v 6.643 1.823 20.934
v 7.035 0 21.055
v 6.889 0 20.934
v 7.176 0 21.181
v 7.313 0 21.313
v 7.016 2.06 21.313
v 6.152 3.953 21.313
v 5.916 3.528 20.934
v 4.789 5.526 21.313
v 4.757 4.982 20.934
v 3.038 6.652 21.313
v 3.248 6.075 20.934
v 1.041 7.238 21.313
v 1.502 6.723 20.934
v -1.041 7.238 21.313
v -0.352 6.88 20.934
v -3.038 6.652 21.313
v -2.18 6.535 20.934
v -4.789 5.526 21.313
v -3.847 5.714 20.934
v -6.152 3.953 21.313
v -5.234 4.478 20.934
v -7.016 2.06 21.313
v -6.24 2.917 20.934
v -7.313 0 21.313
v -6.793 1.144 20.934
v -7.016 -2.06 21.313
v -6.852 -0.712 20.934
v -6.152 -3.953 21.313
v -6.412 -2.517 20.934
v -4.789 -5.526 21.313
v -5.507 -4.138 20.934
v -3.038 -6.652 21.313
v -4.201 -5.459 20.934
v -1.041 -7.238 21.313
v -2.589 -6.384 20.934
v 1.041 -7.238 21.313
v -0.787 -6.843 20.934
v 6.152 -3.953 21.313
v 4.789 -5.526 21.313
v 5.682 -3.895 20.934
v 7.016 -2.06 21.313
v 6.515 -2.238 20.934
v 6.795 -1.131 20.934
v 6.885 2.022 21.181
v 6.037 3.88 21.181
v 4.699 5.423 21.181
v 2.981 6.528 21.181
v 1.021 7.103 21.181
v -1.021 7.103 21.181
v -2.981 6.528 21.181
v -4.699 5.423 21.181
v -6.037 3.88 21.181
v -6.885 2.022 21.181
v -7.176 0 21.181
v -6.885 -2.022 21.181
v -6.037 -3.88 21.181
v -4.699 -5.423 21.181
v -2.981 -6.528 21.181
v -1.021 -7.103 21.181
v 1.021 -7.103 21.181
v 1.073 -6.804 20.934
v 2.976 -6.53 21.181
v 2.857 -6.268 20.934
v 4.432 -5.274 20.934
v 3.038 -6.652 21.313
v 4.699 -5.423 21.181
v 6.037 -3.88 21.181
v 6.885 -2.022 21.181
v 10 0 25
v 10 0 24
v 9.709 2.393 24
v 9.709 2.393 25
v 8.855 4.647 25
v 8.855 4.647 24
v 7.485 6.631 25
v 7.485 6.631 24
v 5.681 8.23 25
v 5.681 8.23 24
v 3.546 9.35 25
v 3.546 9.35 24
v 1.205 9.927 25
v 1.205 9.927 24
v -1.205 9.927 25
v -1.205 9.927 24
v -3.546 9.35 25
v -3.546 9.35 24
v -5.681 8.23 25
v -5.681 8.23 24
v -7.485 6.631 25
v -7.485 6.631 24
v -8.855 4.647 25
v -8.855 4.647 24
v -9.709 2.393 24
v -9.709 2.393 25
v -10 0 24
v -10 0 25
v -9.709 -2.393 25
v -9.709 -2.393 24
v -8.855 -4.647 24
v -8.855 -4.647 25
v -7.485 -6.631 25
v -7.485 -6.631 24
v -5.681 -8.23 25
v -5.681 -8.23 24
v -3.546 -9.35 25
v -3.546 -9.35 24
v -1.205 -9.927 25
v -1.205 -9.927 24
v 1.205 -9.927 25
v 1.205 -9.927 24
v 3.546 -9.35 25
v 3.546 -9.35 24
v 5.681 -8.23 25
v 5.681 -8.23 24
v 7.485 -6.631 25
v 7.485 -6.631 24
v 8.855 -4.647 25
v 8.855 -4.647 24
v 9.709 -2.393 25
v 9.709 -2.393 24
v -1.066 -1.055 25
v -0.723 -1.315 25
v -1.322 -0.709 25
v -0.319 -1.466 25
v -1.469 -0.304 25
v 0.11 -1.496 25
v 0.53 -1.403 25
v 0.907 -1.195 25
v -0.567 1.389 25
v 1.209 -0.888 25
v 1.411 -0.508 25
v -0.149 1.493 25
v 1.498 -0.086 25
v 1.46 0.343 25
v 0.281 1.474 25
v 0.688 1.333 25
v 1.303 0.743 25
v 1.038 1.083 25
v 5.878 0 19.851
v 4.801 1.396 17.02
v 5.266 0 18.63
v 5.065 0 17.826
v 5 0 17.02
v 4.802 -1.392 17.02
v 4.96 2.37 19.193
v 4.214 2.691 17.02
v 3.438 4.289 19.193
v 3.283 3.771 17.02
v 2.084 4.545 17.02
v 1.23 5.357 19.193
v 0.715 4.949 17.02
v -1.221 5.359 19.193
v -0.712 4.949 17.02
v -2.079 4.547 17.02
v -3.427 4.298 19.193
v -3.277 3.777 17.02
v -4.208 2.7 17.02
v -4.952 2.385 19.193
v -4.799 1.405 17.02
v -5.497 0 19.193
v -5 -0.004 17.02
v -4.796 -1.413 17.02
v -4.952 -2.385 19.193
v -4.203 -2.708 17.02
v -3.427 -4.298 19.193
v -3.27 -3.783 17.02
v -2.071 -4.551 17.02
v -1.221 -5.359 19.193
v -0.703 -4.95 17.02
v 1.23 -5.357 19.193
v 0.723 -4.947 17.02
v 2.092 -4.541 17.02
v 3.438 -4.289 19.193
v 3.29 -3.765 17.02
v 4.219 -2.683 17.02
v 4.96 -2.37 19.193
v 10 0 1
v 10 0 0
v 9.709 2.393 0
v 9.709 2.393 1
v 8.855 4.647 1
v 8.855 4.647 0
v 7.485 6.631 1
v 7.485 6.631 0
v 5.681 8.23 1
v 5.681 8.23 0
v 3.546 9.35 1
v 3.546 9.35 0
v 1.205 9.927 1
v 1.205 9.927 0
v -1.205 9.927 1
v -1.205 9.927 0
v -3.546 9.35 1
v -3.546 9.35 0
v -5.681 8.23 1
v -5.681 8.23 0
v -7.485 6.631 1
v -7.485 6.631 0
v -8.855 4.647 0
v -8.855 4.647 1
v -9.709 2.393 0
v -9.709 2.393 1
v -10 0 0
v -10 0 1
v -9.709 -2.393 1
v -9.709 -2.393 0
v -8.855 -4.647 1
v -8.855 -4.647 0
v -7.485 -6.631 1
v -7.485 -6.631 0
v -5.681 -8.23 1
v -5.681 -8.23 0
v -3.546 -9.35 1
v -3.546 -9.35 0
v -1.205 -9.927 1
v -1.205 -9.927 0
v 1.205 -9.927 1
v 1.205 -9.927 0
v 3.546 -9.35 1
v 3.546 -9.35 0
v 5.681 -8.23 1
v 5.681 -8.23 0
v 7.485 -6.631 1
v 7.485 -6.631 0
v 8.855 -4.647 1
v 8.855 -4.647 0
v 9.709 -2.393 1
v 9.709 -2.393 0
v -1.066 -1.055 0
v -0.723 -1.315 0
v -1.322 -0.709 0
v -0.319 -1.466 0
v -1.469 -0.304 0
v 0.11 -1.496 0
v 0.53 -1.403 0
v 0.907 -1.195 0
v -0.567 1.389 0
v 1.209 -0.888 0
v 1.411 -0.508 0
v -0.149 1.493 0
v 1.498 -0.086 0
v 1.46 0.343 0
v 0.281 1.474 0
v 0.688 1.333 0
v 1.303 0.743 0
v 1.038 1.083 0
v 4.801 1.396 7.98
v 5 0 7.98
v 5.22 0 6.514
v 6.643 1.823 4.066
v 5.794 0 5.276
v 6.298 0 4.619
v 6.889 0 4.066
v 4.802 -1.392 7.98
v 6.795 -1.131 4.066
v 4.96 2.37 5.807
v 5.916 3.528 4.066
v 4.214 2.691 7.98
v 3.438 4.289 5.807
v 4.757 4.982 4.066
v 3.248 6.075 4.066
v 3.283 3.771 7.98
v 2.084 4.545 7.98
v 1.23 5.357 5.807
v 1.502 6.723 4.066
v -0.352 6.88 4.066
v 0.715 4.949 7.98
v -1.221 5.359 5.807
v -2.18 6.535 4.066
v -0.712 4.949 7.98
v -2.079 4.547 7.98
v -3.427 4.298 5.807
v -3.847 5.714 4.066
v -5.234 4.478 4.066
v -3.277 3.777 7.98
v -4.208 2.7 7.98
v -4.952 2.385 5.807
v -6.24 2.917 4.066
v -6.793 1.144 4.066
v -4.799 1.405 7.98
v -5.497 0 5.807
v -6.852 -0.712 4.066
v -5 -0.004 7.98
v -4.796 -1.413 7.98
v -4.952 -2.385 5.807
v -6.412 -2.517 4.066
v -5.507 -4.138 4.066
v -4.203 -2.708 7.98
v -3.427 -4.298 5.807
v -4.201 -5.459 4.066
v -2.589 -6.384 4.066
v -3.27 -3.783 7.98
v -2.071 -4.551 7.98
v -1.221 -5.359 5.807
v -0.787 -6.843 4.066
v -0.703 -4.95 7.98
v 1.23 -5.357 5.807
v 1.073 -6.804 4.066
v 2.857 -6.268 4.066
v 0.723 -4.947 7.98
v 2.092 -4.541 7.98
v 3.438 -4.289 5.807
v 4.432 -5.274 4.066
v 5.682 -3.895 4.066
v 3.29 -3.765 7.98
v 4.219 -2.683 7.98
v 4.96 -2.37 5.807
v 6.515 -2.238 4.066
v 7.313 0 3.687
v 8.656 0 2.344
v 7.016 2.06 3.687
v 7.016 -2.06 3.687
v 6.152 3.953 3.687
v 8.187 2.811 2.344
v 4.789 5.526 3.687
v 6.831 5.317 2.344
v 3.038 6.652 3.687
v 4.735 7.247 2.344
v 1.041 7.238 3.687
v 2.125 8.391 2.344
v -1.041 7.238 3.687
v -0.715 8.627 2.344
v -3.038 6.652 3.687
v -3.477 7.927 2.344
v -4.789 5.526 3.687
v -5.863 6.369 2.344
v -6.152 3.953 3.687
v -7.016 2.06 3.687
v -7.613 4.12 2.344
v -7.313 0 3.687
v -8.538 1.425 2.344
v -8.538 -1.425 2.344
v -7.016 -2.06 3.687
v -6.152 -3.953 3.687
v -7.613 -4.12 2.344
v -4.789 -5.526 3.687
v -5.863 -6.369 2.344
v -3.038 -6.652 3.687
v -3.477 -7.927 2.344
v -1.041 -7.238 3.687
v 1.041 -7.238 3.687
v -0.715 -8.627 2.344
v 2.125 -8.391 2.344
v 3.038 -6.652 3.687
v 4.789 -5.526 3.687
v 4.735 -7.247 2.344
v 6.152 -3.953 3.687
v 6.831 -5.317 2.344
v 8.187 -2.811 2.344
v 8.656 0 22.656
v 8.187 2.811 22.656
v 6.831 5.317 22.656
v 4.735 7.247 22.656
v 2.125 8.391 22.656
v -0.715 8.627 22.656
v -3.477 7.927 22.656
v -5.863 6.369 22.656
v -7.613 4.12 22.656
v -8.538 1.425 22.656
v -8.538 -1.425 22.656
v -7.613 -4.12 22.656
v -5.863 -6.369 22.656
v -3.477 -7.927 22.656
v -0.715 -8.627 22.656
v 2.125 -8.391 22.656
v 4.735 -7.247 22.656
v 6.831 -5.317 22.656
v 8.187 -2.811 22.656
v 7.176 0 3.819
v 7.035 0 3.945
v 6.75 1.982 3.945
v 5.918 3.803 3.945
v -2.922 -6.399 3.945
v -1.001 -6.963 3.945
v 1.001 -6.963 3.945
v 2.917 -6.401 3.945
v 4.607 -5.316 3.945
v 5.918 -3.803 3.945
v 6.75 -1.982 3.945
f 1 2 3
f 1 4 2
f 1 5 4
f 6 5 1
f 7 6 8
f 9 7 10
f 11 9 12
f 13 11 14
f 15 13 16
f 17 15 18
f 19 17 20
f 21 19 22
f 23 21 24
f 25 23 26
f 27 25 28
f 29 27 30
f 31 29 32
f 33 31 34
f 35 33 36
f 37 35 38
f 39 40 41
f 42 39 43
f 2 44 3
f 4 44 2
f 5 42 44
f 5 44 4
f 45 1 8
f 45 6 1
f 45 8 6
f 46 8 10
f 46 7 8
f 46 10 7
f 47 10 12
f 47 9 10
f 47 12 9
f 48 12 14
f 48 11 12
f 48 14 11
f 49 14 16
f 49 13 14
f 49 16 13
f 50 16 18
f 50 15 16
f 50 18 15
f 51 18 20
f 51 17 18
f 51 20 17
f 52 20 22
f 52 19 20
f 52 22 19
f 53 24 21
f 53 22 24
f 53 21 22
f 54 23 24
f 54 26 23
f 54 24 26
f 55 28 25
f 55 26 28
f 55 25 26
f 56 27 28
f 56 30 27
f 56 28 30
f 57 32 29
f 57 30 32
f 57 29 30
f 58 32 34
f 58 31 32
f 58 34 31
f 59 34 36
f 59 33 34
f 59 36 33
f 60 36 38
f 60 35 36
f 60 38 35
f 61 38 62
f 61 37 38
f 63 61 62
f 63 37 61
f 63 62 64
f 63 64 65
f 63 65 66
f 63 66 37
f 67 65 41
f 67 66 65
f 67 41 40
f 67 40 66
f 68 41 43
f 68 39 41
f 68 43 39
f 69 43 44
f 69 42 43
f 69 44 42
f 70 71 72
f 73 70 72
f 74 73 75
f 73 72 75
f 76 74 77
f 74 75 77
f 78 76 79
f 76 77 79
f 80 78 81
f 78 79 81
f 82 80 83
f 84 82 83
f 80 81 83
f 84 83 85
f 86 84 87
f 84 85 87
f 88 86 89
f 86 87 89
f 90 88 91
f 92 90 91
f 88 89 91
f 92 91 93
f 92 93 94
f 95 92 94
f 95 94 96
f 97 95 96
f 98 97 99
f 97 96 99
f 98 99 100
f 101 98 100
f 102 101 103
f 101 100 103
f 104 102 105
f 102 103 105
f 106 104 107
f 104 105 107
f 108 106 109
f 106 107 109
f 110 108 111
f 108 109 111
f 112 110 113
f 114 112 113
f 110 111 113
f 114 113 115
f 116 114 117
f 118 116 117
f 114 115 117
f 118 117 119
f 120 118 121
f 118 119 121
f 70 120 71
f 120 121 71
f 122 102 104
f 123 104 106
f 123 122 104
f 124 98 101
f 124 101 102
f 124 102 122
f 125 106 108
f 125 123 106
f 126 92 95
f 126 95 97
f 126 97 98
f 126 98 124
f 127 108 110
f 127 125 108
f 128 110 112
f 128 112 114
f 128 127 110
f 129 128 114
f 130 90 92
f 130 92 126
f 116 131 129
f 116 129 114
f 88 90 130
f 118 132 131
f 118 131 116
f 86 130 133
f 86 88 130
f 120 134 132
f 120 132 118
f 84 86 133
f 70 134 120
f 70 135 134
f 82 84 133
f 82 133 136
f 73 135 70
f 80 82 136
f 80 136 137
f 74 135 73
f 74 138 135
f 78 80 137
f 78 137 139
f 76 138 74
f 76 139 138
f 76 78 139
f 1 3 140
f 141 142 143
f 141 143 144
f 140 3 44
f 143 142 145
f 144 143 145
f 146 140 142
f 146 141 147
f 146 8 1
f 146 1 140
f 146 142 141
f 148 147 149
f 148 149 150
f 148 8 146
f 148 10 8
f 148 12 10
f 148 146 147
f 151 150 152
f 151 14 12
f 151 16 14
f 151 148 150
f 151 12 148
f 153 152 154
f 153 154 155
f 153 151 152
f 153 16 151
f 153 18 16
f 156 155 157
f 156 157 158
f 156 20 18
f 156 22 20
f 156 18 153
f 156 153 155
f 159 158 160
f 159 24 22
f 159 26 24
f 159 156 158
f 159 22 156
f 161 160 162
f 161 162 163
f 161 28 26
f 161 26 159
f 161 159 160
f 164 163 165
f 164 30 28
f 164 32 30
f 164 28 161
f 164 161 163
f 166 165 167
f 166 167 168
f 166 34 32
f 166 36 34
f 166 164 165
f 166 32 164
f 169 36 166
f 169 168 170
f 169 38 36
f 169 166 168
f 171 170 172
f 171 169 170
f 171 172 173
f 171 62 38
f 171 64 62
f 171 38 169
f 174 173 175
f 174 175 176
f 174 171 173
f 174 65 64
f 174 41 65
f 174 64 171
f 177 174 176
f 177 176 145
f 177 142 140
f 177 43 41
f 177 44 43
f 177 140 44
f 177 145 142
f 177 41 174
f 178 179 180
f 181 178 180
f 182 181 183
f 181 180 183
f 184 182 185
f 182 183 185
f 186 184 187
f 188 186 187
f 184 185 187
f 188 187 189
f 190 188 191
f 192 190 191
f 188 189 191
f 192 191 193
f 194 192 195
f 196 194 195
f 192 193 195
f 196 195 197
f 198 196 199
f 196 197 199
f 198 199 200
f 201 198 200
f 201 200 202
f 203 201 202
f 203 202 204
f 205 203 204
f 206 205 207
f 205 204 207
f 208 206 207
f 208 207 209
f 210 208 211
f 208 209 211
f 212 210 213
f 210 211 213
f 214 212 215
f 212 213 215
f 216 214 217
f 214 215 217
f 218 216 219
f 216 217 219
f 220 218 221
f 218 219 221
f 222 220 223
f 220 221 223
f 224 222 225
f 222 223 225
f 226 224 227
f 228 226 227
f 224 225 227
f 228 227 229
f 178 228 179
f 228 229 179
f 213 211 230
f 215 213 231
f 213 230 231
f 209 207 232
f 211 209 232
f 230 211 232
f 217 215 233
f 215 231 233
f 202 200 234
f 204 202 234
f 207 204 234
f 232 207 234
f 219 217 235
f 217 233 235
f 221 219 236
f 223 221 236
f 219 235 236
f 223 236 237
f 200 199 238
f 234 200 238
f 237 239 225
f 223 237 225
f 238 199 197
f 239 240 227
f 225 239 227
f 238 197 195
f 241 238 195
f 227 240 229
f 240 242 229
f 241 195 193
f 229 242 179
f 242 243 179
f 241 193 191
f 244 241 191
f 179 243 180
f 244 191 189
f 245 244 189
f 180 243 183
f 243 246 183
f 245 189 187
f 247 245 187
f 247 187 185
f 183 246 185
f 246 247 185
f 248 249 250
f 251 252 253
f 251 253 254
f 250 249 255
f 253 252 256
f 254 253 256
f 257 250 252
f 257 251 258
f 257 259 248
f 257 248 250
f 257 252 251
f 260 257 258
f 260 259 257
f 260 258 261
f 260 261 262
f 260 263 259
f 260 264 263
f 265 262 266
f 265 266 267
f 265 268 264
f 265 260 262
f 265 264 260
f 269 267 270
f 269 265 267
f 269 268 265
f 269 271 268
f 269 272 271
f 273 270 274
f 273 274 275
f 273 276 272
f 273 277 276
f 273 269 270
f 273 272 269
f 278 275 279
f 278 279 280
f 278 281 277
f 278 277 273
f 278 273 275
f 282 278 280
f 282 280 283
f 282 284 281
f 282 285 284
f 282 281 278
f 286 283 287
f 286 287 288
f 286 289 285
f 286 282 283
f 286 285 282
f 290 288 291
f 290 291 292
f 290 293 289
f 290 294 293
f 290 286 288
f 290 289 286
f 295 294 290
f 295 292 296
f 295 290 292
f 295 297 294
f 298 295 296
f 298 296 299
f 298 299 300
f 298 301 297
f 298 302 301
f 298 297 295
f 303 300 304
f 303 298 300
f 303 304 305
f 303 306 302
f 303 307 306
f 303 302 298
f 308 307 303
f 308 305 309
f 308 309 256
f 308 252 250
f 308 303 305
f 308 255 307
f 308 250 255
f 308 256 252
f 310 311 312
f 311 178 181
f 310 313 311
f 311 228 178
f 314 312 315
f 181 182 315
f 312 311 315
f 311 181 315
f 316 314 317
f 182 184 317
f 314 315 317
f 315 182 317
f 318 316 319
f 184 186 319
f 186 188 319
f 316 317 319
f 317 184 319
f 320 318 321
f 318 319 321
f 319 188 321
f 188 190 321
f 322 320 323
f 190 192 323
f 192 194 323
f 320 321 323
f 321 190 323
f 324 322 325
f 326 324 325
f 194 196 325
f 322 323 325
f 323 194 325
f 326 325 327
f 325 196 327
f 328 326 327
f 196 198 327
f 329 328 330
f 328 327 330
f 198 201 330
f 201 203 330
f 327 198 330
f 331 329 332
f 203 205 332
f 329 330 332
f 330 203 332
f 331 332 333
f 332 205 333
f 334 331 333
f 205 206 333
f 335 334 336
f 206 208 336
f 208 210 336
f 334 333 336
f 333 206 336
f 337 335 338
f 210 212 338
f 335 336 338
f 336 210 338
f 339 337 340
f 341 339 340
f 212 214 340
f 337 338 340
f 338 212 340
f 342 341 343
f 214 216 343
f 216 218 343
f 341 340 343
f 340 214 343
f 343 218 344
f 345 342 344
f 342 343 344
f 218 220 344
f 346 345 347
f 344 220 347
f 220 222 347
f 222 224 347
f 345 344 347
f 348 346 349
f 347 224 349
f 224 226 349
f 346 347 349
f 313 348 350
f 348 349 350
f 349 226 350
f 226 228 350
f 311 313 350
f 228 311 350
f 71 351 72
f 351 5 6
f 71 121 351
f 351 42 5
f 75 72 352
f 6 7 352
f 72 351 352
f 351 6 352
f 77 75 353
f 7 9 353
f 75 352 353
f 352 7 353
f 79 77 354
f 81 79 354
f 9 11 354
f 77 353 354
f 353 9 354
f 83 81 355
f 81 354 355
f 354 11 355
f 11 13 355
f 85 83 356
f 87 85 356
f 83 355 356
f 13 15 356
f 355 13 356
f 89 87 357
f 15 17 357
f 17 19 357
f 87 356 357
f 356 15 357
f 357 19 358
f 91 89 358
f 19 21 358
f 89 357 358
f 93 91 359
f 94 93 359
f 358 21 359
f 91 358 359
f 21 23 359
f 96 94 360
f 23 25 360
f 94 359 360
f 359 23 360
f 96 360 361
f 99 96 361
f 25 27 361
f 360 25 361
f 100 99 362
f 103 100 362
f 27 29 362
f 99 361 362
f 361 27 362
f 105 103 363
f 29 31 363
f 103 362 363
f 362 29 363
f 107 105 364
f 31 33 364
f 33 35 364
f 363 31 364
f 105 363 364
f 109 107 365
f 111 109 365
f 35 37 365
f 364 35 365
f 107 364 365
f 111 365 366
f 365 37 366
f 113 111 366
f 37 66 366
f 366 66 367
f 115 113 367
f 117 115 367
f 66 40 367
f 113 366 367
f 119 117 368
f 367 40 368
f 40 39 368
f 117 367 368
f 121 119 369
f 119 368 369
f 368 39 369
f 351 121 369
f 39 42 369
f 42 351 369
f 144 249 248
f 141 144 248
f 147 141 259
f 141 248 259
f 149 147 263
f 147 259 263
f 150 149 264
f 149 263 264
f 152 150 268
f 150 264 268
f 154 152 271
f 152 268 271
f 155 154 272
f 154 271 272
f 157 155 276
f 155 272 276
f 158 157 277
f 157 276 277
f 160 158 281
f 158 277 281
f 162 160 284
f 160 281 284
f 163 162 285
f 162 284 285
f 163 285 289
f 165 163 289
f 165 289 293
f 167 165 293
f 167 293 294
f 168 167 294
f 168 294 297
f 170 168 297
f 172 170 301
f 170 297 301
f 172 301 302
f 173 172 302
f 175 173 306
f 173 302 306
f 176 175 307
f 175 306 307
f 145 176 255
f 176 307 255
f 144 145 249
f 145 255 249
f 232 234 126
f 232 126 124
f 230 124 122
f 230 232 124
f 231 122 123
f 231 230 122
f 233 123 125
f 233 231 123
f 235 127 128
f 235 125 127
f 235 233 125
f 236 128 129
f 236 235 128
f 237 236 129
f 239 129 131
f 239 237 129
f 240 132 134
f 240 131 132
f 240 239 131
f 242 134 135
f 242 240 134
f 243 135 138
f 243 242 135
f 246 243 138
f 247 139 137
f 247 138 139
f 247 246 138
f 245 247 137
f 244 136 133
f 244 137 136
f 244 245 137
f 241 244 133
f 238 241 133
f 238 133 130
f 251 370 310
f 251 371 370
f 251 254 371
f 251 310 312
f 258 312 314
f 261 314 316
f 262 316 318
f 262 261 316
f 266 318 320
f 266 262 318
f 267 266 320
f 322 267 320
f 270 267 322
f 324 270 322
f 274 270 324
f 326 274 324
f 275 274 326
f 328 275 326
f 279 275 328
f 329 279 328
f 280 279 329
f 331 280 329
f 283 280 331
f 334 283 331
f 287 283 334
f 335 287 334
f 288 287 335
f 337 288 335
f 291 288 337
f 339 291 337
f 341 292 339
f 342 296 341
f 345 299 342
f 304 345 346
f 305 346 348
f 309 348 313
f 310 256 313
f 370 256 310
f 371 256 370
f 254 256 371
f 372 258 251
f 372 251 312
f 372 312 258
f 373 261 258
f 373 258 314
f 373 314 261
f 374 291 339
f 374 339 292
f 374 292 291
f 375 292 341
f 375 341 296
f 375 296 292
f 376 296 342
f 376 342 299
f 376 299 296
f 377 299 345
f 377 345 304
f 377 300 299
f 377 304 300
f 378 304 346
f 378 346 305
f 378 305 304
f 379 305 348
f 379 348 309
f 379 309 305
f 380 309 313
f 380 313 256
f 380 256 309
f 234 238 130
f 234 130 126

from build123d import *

# Parameters (mm, degrees)
SKETCH1_R           = 10
BOSS_EXTRUDE1_DEPTH = 5
SKETCH3_R           = 5
BOSS_EXTRUDE3_DEPTH = 15
SKETCH4_R           = 10
BOSS_EXTRUDE4_DEPTH = 5
CUT_EXTRUDE1_DEPTH  = 26
CHAMFER3_SIZE       = 4
FILLET6_R           = 5
FILLET7_R           = 5


with BuildPart() as part:
    # Sketch1 → Boss-Extrude1 (new body)
    with BuildSketch(Plane.XY):
        Circle(SKETCH1_R)
    extrude(amount=BOSS_EXTRUDE1_DEPTH)

    # Sketch3 → Boss-Extrude3 (add)
    with BuildSketch(Plane.XY.offset(5)):
        Circle(SKETCH3_R)
    extrude(amount=BOSS_EXTRUDE3_DEPTH)

    # Sketch4 → Boss-Extrude4 (add)
    with BuildSketch(Plane.XY.offset(20)):
        Circle(SKETCH4_R)
    extrude(amount=BOSS_EXTRUDE4_DEPTH)

    # Sketch5 → Cut-Extrude1 (cut)
    with BuildSketch(Plane(origin=(0, 0, 0), x_dir=(-1, 0, 0), z_dir=(0, 0, -1))):
        with BuildLine():
            Line((0.567187137, 1.388631971), (1.468830879, -0.304197058))
            ThreePointArc((1.468830879, -0.304197058), (-1.323918378, -0.705152558), (0.567187137, 1.388631971))
        make_face()
    extrude(amount=-CUT_EXTRUDE1_DEPTH, mode=Mode.SUBTRACT)

    # Chamfer3
    chamfer3_edges = [part.edges().sort_by_distance(p)[0] for p in [
        (-10, 0, 20),
        (-10, 0, 5),
    ]]
    chamfer(chamfer3_edges, length=CHAMFER3_SIZE)

    # Fillet6
    # the kernel refuses this fillet: 5 mm, written as the material it takes off along each edge
    with BuildSketch(Plane(origin=(0, 0, 20), x_dir=(1, 0, 0), z_dir=(0, -1, 0))) as fillet6_piece_1:
        with BuildLine():
            CenterArc((3.777070272, 4.848138084), FILLET6_R, 284.157365729, 30.842634271)
            Line((5, 0), (5.024458595, -0.096962762))
            ThreePointArc((5.024458595, -0.096962762), (5.5, -0.1), (6, -0.1))
            Line((6, -0.1), (6.070710678, -0.070710678))
            Line((6.070710678, -0.070710678), (7.383314856, 1.2418935))
            Line((7.383314856, 1.2418935), (7.312604178, 1.312604178))
        make_face()
    revolve(axis=Axis((0, 0, 20), (0, 0, 1)), mode=Mode.SUBTRACT)
    with BuildSketch(Plane(origin=(0, 0, 5), x_dir=(1, 0, 0), z_dir=(0, -1, 0))) as fillet6_piece_2:
        with BuildLine():
            CenterArc((3.777070272, -4.848138084), FILLET6_R, 45, 30.842634271)
            Line((7.312604178, -1.312604178), (7.383314856, -1.2418935))
            Line((7.383314856, -1.2418935), (6.070710678, 0.070710678))
            Line((6.070710678, 0.070710678), (6, 0.1))
            ThreePointArc((6, 0.1), (5.5, 0.1), (5.024458595, 0.096962762))
            Line((5.024458595, 0.096962762), (5, 0))
        make_face()
    revolve(axis=Axis((0, 0, 5), (0, 0, 1)), mode=Mode.SUBTRACT)

    # Fillet7
    fillet7_edges = [part.edges().sort_by_distance(p)[0] for p in [
        (-5, 0, 5),
        (-5, 0, 20),
    ]]
    fillet(fillet7_edges, radius=FILLET7_R)


solid = part.part
